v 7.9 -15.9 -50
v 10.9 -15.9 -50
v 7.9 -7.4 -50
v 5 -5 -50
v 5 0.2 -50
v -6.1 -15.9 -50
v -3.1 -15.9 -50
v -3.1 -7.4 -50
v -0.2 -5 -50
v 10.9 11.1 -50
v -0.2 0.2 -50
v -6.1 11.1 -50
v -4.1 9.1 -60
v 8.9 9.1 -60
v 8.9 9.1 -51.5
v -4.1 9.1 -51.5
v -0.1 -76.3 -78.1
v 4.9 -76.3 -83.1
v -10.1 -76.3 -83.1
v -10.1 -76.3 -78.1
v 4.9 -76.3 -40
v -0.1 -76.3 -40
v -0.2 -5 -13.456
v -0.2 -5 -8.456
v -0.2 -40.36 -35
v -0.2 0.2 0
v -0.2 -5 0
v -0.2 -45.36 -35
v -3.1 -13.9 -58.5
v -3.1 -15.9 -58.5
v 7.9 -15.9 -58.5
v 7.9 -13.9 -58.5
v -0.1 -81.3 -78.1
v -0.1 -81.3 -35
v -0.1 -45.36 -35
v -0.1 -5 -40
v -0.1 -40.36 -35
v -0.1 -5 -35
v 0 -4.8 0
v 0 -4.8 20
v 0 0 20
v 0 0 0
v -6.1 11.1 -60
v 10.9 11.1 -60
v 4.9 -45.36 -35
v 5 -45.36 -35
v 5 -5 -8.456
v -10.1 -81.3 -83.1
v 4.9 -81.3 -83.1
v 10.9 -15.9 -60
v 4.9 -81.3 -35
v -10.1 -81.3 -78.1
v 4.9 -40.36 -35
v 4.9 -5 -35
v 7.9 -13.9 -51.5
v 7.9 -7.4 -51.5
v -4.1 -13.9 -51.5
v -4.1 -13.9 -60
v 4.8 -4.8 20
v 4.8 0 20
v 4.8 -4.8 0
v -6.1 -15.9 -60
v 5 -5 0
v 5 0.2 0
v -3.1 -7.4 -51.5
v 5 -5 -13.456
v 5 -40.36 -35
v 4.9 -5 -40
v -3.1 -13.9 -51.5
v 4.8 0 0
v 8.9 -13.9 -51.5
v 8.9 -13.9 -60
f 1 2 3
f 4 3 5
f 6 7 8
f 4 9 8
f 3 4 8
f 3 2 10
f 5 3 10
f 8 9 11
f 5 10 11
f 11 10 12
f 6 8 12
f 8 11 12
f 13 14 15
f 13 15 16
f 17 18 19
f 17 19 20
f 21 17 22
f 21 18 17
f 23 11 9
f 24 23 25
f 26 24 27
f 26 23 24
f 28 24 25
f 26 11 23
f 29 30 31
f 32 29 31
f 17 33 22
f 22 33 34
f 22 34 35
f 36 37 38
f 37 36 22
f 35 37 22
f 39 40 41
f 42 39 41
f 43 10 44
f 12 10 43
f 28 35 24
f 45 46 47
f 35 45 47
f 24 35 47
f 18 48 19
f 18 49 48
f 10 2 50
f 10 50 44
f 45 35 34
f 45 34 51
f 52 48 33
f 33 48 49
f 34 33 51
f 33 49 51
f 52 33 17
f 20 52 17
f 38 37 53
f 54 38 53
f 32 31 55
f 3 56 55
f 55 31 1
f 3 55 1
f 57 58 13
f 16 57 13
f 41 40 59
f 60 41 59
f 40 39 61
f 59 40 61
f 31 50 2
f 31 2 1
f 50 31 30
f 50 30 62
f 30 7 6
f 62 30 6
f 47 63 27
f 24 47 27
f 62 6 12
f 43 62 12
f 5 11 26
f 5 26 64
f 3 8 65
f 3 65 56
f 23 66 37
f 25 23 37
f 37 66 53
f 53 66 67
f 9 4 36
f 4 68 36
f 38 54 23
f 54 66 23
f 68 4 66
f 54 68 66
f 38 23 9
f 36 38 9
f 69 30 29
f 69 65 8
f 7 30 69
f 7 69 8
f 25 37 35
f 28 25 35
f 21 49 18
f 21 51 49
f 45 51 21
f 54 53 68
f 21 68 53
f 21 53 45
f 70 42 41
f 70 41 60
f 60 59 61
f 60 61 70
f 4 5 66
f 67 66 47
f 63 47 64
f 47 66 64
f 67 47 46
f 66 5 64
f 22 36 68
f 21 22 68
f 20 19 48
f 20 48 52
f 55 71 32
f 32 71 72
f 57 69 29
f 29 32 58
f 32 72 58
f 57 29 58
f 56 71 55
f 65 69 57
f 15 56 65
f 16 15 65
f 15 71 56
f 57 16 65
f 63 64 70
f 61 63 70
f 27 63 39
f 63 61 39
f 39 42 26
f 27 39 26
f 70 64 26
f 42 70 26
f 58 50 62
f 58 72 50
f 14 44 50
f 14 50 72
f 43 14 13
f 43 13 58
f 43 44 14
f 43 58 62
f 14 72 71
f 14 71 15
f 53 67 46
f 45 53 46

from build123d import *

# Parameters (mm, degrees)
SKETCH1_W           = 4.8
SKETCH1_H           = 4.8
BOSS_EXTRUDE1_DEPTH = 20
SKETCH2_W           = 5.2
SKETCH2_H           = 5.2
BOSS_EXTRUDE2_DEPTH = 50
SKETCH3_W           = 17
SKETCH3_H           = 27
BOSS_EXTRUDE3_DEPTH = 10
SKETCH4_W           = 13
SKETCH4_H           = 23
CUT_EXTRUDE1_DEPTH  = 8.5
SKETCH5_W           = 11
SKETCH5_H           = 8.5
CUT_EXTRUDE2_DEPTH  = 8.5
SKETCH6_W           = 5
SKETCH6_H           = 5
BOSS_EXTRUDE4_DEPTH = 81.5
SKETCH7_W           = 5
SKETCH7_H           = 5
BOSS_EXTRUDE5_DEPTH = 43.1
BOSS_EXTRUDE6_DEPTH = 5.2
SKETCH13_W          = 5
SKETCH13_H          = 5
BOSS_EXTRUDE7_DEPTH = 10


with BuildPart() as part:
    # Sketch1 → Boss-Extrude1 (new body)
    with BuildSketch(Plane.XY):
        with Locations((2.4, -2.4)):
            Rectangle(SKETCH1_W, SKETCH1_H)
    extrude(amount=BOSS_EXTRUDE1_DEPTH)

    # Sketch2 → Boss-Extrude2 (add)
    with BuildSketch(Plane(origin=(0, 0, 0), x_dir=(-1, 0, 0), z_dir=(0, 0, -1))):
        with Locations((-2.4, -2.4)):
            Rectangle(SKETCH2_W, SKETCH2_H)
    extrude(amount=BOSS_EXTRUDE2_DEPTH)

    # Sketch3 → Boss-Extrude3 (add)
    with BuildSketch(Plane(origin=(0, 0, -50), x_dir=(-1, 0, 0), z_dir=(0, 0, -1))):
        with Locations((-2.4, -2.4)):
            Rectangle(SKETCH3_W, SKETCH3_H)
    extrude(amount=BOSS_EXTRUDE3_DEPTH)

    # Sketch4 → Cut-Extrude1 (cut)
    with BuildSketch(Plane(origin=(0, 0, -60), x_dir=(-1, 0, 0), z_dir=(0, 0, -1))):
        with Locations((-2.4, -2.4)):
            Rectangle(SKETCH4_W, SKETCH4_H)
    extrude(amount=-CUT_EXTRUDE1_DEPTH, mode=Mode.SUBTRACT)

    # Sketch5 → Cut-Extrude2 (cut)
    with BuildSketch(Plane.XZ.offset(15.9)):
        with Locations((2.4, -54.25)):
            Rectangle(SKETCH5_W, SKETCH5_H)
    extrude(amount=-CUT_EXTRUDE2_DEPTH, mode=Mode.SUBTRACT)

    # Sketch6 → Boss-Extrude4 (add)
    with BuildSketch(Plane(origin=(0, 0.2, 0), x_dir=(1, 0, 0), z_dir=(0, 1, 0))):
        with Locations((2.4, 37.5)):
            Rectangle(SKETCH6_W, SKETCH6_H)
    extrude(amount=-BOSS_EXTRUDE4_DEPTH)

    # Sketch7 → Boss-Extrude5 (add)
    with BuildSketch(Plane(origin=(0, 0, -40), x_dir=(-1, 0, 0), z_dir=(0, 0, -1))):
        with Locations((-2.4, -78.8)):
            Rectangle(SKETCH7_W, SKETCH7_H)
    extrude(amount=BOSS_EXTRUDE5_DEPTH)

    # Sketch12 → Boss-Extrude6 (add)
    with BuildSketch(Plane(origin=(5, 0, 0), x_dir=(0, 0, -1), z_dir=(1, 0, 0))):
        Polygon((13.455782968, -5), (35, -40.359932103), (35, -45.359932103), (8.455782968, -5), align=None)
    extrude(amount=-BOSS_EXTRUDE6_DEPTH)

    # Sketch13 → Boss-Extrude7 (add)
    with BuildSketch(Plane.ZY.offset(0.1)):
        with Locations((-80.6, -78.8)):
            Rectangle(SKETCH13_W, SKETCH13_H)
    extrude(amount=BOSS_EXTRUDE7_DEPTH)


solid = part.part
